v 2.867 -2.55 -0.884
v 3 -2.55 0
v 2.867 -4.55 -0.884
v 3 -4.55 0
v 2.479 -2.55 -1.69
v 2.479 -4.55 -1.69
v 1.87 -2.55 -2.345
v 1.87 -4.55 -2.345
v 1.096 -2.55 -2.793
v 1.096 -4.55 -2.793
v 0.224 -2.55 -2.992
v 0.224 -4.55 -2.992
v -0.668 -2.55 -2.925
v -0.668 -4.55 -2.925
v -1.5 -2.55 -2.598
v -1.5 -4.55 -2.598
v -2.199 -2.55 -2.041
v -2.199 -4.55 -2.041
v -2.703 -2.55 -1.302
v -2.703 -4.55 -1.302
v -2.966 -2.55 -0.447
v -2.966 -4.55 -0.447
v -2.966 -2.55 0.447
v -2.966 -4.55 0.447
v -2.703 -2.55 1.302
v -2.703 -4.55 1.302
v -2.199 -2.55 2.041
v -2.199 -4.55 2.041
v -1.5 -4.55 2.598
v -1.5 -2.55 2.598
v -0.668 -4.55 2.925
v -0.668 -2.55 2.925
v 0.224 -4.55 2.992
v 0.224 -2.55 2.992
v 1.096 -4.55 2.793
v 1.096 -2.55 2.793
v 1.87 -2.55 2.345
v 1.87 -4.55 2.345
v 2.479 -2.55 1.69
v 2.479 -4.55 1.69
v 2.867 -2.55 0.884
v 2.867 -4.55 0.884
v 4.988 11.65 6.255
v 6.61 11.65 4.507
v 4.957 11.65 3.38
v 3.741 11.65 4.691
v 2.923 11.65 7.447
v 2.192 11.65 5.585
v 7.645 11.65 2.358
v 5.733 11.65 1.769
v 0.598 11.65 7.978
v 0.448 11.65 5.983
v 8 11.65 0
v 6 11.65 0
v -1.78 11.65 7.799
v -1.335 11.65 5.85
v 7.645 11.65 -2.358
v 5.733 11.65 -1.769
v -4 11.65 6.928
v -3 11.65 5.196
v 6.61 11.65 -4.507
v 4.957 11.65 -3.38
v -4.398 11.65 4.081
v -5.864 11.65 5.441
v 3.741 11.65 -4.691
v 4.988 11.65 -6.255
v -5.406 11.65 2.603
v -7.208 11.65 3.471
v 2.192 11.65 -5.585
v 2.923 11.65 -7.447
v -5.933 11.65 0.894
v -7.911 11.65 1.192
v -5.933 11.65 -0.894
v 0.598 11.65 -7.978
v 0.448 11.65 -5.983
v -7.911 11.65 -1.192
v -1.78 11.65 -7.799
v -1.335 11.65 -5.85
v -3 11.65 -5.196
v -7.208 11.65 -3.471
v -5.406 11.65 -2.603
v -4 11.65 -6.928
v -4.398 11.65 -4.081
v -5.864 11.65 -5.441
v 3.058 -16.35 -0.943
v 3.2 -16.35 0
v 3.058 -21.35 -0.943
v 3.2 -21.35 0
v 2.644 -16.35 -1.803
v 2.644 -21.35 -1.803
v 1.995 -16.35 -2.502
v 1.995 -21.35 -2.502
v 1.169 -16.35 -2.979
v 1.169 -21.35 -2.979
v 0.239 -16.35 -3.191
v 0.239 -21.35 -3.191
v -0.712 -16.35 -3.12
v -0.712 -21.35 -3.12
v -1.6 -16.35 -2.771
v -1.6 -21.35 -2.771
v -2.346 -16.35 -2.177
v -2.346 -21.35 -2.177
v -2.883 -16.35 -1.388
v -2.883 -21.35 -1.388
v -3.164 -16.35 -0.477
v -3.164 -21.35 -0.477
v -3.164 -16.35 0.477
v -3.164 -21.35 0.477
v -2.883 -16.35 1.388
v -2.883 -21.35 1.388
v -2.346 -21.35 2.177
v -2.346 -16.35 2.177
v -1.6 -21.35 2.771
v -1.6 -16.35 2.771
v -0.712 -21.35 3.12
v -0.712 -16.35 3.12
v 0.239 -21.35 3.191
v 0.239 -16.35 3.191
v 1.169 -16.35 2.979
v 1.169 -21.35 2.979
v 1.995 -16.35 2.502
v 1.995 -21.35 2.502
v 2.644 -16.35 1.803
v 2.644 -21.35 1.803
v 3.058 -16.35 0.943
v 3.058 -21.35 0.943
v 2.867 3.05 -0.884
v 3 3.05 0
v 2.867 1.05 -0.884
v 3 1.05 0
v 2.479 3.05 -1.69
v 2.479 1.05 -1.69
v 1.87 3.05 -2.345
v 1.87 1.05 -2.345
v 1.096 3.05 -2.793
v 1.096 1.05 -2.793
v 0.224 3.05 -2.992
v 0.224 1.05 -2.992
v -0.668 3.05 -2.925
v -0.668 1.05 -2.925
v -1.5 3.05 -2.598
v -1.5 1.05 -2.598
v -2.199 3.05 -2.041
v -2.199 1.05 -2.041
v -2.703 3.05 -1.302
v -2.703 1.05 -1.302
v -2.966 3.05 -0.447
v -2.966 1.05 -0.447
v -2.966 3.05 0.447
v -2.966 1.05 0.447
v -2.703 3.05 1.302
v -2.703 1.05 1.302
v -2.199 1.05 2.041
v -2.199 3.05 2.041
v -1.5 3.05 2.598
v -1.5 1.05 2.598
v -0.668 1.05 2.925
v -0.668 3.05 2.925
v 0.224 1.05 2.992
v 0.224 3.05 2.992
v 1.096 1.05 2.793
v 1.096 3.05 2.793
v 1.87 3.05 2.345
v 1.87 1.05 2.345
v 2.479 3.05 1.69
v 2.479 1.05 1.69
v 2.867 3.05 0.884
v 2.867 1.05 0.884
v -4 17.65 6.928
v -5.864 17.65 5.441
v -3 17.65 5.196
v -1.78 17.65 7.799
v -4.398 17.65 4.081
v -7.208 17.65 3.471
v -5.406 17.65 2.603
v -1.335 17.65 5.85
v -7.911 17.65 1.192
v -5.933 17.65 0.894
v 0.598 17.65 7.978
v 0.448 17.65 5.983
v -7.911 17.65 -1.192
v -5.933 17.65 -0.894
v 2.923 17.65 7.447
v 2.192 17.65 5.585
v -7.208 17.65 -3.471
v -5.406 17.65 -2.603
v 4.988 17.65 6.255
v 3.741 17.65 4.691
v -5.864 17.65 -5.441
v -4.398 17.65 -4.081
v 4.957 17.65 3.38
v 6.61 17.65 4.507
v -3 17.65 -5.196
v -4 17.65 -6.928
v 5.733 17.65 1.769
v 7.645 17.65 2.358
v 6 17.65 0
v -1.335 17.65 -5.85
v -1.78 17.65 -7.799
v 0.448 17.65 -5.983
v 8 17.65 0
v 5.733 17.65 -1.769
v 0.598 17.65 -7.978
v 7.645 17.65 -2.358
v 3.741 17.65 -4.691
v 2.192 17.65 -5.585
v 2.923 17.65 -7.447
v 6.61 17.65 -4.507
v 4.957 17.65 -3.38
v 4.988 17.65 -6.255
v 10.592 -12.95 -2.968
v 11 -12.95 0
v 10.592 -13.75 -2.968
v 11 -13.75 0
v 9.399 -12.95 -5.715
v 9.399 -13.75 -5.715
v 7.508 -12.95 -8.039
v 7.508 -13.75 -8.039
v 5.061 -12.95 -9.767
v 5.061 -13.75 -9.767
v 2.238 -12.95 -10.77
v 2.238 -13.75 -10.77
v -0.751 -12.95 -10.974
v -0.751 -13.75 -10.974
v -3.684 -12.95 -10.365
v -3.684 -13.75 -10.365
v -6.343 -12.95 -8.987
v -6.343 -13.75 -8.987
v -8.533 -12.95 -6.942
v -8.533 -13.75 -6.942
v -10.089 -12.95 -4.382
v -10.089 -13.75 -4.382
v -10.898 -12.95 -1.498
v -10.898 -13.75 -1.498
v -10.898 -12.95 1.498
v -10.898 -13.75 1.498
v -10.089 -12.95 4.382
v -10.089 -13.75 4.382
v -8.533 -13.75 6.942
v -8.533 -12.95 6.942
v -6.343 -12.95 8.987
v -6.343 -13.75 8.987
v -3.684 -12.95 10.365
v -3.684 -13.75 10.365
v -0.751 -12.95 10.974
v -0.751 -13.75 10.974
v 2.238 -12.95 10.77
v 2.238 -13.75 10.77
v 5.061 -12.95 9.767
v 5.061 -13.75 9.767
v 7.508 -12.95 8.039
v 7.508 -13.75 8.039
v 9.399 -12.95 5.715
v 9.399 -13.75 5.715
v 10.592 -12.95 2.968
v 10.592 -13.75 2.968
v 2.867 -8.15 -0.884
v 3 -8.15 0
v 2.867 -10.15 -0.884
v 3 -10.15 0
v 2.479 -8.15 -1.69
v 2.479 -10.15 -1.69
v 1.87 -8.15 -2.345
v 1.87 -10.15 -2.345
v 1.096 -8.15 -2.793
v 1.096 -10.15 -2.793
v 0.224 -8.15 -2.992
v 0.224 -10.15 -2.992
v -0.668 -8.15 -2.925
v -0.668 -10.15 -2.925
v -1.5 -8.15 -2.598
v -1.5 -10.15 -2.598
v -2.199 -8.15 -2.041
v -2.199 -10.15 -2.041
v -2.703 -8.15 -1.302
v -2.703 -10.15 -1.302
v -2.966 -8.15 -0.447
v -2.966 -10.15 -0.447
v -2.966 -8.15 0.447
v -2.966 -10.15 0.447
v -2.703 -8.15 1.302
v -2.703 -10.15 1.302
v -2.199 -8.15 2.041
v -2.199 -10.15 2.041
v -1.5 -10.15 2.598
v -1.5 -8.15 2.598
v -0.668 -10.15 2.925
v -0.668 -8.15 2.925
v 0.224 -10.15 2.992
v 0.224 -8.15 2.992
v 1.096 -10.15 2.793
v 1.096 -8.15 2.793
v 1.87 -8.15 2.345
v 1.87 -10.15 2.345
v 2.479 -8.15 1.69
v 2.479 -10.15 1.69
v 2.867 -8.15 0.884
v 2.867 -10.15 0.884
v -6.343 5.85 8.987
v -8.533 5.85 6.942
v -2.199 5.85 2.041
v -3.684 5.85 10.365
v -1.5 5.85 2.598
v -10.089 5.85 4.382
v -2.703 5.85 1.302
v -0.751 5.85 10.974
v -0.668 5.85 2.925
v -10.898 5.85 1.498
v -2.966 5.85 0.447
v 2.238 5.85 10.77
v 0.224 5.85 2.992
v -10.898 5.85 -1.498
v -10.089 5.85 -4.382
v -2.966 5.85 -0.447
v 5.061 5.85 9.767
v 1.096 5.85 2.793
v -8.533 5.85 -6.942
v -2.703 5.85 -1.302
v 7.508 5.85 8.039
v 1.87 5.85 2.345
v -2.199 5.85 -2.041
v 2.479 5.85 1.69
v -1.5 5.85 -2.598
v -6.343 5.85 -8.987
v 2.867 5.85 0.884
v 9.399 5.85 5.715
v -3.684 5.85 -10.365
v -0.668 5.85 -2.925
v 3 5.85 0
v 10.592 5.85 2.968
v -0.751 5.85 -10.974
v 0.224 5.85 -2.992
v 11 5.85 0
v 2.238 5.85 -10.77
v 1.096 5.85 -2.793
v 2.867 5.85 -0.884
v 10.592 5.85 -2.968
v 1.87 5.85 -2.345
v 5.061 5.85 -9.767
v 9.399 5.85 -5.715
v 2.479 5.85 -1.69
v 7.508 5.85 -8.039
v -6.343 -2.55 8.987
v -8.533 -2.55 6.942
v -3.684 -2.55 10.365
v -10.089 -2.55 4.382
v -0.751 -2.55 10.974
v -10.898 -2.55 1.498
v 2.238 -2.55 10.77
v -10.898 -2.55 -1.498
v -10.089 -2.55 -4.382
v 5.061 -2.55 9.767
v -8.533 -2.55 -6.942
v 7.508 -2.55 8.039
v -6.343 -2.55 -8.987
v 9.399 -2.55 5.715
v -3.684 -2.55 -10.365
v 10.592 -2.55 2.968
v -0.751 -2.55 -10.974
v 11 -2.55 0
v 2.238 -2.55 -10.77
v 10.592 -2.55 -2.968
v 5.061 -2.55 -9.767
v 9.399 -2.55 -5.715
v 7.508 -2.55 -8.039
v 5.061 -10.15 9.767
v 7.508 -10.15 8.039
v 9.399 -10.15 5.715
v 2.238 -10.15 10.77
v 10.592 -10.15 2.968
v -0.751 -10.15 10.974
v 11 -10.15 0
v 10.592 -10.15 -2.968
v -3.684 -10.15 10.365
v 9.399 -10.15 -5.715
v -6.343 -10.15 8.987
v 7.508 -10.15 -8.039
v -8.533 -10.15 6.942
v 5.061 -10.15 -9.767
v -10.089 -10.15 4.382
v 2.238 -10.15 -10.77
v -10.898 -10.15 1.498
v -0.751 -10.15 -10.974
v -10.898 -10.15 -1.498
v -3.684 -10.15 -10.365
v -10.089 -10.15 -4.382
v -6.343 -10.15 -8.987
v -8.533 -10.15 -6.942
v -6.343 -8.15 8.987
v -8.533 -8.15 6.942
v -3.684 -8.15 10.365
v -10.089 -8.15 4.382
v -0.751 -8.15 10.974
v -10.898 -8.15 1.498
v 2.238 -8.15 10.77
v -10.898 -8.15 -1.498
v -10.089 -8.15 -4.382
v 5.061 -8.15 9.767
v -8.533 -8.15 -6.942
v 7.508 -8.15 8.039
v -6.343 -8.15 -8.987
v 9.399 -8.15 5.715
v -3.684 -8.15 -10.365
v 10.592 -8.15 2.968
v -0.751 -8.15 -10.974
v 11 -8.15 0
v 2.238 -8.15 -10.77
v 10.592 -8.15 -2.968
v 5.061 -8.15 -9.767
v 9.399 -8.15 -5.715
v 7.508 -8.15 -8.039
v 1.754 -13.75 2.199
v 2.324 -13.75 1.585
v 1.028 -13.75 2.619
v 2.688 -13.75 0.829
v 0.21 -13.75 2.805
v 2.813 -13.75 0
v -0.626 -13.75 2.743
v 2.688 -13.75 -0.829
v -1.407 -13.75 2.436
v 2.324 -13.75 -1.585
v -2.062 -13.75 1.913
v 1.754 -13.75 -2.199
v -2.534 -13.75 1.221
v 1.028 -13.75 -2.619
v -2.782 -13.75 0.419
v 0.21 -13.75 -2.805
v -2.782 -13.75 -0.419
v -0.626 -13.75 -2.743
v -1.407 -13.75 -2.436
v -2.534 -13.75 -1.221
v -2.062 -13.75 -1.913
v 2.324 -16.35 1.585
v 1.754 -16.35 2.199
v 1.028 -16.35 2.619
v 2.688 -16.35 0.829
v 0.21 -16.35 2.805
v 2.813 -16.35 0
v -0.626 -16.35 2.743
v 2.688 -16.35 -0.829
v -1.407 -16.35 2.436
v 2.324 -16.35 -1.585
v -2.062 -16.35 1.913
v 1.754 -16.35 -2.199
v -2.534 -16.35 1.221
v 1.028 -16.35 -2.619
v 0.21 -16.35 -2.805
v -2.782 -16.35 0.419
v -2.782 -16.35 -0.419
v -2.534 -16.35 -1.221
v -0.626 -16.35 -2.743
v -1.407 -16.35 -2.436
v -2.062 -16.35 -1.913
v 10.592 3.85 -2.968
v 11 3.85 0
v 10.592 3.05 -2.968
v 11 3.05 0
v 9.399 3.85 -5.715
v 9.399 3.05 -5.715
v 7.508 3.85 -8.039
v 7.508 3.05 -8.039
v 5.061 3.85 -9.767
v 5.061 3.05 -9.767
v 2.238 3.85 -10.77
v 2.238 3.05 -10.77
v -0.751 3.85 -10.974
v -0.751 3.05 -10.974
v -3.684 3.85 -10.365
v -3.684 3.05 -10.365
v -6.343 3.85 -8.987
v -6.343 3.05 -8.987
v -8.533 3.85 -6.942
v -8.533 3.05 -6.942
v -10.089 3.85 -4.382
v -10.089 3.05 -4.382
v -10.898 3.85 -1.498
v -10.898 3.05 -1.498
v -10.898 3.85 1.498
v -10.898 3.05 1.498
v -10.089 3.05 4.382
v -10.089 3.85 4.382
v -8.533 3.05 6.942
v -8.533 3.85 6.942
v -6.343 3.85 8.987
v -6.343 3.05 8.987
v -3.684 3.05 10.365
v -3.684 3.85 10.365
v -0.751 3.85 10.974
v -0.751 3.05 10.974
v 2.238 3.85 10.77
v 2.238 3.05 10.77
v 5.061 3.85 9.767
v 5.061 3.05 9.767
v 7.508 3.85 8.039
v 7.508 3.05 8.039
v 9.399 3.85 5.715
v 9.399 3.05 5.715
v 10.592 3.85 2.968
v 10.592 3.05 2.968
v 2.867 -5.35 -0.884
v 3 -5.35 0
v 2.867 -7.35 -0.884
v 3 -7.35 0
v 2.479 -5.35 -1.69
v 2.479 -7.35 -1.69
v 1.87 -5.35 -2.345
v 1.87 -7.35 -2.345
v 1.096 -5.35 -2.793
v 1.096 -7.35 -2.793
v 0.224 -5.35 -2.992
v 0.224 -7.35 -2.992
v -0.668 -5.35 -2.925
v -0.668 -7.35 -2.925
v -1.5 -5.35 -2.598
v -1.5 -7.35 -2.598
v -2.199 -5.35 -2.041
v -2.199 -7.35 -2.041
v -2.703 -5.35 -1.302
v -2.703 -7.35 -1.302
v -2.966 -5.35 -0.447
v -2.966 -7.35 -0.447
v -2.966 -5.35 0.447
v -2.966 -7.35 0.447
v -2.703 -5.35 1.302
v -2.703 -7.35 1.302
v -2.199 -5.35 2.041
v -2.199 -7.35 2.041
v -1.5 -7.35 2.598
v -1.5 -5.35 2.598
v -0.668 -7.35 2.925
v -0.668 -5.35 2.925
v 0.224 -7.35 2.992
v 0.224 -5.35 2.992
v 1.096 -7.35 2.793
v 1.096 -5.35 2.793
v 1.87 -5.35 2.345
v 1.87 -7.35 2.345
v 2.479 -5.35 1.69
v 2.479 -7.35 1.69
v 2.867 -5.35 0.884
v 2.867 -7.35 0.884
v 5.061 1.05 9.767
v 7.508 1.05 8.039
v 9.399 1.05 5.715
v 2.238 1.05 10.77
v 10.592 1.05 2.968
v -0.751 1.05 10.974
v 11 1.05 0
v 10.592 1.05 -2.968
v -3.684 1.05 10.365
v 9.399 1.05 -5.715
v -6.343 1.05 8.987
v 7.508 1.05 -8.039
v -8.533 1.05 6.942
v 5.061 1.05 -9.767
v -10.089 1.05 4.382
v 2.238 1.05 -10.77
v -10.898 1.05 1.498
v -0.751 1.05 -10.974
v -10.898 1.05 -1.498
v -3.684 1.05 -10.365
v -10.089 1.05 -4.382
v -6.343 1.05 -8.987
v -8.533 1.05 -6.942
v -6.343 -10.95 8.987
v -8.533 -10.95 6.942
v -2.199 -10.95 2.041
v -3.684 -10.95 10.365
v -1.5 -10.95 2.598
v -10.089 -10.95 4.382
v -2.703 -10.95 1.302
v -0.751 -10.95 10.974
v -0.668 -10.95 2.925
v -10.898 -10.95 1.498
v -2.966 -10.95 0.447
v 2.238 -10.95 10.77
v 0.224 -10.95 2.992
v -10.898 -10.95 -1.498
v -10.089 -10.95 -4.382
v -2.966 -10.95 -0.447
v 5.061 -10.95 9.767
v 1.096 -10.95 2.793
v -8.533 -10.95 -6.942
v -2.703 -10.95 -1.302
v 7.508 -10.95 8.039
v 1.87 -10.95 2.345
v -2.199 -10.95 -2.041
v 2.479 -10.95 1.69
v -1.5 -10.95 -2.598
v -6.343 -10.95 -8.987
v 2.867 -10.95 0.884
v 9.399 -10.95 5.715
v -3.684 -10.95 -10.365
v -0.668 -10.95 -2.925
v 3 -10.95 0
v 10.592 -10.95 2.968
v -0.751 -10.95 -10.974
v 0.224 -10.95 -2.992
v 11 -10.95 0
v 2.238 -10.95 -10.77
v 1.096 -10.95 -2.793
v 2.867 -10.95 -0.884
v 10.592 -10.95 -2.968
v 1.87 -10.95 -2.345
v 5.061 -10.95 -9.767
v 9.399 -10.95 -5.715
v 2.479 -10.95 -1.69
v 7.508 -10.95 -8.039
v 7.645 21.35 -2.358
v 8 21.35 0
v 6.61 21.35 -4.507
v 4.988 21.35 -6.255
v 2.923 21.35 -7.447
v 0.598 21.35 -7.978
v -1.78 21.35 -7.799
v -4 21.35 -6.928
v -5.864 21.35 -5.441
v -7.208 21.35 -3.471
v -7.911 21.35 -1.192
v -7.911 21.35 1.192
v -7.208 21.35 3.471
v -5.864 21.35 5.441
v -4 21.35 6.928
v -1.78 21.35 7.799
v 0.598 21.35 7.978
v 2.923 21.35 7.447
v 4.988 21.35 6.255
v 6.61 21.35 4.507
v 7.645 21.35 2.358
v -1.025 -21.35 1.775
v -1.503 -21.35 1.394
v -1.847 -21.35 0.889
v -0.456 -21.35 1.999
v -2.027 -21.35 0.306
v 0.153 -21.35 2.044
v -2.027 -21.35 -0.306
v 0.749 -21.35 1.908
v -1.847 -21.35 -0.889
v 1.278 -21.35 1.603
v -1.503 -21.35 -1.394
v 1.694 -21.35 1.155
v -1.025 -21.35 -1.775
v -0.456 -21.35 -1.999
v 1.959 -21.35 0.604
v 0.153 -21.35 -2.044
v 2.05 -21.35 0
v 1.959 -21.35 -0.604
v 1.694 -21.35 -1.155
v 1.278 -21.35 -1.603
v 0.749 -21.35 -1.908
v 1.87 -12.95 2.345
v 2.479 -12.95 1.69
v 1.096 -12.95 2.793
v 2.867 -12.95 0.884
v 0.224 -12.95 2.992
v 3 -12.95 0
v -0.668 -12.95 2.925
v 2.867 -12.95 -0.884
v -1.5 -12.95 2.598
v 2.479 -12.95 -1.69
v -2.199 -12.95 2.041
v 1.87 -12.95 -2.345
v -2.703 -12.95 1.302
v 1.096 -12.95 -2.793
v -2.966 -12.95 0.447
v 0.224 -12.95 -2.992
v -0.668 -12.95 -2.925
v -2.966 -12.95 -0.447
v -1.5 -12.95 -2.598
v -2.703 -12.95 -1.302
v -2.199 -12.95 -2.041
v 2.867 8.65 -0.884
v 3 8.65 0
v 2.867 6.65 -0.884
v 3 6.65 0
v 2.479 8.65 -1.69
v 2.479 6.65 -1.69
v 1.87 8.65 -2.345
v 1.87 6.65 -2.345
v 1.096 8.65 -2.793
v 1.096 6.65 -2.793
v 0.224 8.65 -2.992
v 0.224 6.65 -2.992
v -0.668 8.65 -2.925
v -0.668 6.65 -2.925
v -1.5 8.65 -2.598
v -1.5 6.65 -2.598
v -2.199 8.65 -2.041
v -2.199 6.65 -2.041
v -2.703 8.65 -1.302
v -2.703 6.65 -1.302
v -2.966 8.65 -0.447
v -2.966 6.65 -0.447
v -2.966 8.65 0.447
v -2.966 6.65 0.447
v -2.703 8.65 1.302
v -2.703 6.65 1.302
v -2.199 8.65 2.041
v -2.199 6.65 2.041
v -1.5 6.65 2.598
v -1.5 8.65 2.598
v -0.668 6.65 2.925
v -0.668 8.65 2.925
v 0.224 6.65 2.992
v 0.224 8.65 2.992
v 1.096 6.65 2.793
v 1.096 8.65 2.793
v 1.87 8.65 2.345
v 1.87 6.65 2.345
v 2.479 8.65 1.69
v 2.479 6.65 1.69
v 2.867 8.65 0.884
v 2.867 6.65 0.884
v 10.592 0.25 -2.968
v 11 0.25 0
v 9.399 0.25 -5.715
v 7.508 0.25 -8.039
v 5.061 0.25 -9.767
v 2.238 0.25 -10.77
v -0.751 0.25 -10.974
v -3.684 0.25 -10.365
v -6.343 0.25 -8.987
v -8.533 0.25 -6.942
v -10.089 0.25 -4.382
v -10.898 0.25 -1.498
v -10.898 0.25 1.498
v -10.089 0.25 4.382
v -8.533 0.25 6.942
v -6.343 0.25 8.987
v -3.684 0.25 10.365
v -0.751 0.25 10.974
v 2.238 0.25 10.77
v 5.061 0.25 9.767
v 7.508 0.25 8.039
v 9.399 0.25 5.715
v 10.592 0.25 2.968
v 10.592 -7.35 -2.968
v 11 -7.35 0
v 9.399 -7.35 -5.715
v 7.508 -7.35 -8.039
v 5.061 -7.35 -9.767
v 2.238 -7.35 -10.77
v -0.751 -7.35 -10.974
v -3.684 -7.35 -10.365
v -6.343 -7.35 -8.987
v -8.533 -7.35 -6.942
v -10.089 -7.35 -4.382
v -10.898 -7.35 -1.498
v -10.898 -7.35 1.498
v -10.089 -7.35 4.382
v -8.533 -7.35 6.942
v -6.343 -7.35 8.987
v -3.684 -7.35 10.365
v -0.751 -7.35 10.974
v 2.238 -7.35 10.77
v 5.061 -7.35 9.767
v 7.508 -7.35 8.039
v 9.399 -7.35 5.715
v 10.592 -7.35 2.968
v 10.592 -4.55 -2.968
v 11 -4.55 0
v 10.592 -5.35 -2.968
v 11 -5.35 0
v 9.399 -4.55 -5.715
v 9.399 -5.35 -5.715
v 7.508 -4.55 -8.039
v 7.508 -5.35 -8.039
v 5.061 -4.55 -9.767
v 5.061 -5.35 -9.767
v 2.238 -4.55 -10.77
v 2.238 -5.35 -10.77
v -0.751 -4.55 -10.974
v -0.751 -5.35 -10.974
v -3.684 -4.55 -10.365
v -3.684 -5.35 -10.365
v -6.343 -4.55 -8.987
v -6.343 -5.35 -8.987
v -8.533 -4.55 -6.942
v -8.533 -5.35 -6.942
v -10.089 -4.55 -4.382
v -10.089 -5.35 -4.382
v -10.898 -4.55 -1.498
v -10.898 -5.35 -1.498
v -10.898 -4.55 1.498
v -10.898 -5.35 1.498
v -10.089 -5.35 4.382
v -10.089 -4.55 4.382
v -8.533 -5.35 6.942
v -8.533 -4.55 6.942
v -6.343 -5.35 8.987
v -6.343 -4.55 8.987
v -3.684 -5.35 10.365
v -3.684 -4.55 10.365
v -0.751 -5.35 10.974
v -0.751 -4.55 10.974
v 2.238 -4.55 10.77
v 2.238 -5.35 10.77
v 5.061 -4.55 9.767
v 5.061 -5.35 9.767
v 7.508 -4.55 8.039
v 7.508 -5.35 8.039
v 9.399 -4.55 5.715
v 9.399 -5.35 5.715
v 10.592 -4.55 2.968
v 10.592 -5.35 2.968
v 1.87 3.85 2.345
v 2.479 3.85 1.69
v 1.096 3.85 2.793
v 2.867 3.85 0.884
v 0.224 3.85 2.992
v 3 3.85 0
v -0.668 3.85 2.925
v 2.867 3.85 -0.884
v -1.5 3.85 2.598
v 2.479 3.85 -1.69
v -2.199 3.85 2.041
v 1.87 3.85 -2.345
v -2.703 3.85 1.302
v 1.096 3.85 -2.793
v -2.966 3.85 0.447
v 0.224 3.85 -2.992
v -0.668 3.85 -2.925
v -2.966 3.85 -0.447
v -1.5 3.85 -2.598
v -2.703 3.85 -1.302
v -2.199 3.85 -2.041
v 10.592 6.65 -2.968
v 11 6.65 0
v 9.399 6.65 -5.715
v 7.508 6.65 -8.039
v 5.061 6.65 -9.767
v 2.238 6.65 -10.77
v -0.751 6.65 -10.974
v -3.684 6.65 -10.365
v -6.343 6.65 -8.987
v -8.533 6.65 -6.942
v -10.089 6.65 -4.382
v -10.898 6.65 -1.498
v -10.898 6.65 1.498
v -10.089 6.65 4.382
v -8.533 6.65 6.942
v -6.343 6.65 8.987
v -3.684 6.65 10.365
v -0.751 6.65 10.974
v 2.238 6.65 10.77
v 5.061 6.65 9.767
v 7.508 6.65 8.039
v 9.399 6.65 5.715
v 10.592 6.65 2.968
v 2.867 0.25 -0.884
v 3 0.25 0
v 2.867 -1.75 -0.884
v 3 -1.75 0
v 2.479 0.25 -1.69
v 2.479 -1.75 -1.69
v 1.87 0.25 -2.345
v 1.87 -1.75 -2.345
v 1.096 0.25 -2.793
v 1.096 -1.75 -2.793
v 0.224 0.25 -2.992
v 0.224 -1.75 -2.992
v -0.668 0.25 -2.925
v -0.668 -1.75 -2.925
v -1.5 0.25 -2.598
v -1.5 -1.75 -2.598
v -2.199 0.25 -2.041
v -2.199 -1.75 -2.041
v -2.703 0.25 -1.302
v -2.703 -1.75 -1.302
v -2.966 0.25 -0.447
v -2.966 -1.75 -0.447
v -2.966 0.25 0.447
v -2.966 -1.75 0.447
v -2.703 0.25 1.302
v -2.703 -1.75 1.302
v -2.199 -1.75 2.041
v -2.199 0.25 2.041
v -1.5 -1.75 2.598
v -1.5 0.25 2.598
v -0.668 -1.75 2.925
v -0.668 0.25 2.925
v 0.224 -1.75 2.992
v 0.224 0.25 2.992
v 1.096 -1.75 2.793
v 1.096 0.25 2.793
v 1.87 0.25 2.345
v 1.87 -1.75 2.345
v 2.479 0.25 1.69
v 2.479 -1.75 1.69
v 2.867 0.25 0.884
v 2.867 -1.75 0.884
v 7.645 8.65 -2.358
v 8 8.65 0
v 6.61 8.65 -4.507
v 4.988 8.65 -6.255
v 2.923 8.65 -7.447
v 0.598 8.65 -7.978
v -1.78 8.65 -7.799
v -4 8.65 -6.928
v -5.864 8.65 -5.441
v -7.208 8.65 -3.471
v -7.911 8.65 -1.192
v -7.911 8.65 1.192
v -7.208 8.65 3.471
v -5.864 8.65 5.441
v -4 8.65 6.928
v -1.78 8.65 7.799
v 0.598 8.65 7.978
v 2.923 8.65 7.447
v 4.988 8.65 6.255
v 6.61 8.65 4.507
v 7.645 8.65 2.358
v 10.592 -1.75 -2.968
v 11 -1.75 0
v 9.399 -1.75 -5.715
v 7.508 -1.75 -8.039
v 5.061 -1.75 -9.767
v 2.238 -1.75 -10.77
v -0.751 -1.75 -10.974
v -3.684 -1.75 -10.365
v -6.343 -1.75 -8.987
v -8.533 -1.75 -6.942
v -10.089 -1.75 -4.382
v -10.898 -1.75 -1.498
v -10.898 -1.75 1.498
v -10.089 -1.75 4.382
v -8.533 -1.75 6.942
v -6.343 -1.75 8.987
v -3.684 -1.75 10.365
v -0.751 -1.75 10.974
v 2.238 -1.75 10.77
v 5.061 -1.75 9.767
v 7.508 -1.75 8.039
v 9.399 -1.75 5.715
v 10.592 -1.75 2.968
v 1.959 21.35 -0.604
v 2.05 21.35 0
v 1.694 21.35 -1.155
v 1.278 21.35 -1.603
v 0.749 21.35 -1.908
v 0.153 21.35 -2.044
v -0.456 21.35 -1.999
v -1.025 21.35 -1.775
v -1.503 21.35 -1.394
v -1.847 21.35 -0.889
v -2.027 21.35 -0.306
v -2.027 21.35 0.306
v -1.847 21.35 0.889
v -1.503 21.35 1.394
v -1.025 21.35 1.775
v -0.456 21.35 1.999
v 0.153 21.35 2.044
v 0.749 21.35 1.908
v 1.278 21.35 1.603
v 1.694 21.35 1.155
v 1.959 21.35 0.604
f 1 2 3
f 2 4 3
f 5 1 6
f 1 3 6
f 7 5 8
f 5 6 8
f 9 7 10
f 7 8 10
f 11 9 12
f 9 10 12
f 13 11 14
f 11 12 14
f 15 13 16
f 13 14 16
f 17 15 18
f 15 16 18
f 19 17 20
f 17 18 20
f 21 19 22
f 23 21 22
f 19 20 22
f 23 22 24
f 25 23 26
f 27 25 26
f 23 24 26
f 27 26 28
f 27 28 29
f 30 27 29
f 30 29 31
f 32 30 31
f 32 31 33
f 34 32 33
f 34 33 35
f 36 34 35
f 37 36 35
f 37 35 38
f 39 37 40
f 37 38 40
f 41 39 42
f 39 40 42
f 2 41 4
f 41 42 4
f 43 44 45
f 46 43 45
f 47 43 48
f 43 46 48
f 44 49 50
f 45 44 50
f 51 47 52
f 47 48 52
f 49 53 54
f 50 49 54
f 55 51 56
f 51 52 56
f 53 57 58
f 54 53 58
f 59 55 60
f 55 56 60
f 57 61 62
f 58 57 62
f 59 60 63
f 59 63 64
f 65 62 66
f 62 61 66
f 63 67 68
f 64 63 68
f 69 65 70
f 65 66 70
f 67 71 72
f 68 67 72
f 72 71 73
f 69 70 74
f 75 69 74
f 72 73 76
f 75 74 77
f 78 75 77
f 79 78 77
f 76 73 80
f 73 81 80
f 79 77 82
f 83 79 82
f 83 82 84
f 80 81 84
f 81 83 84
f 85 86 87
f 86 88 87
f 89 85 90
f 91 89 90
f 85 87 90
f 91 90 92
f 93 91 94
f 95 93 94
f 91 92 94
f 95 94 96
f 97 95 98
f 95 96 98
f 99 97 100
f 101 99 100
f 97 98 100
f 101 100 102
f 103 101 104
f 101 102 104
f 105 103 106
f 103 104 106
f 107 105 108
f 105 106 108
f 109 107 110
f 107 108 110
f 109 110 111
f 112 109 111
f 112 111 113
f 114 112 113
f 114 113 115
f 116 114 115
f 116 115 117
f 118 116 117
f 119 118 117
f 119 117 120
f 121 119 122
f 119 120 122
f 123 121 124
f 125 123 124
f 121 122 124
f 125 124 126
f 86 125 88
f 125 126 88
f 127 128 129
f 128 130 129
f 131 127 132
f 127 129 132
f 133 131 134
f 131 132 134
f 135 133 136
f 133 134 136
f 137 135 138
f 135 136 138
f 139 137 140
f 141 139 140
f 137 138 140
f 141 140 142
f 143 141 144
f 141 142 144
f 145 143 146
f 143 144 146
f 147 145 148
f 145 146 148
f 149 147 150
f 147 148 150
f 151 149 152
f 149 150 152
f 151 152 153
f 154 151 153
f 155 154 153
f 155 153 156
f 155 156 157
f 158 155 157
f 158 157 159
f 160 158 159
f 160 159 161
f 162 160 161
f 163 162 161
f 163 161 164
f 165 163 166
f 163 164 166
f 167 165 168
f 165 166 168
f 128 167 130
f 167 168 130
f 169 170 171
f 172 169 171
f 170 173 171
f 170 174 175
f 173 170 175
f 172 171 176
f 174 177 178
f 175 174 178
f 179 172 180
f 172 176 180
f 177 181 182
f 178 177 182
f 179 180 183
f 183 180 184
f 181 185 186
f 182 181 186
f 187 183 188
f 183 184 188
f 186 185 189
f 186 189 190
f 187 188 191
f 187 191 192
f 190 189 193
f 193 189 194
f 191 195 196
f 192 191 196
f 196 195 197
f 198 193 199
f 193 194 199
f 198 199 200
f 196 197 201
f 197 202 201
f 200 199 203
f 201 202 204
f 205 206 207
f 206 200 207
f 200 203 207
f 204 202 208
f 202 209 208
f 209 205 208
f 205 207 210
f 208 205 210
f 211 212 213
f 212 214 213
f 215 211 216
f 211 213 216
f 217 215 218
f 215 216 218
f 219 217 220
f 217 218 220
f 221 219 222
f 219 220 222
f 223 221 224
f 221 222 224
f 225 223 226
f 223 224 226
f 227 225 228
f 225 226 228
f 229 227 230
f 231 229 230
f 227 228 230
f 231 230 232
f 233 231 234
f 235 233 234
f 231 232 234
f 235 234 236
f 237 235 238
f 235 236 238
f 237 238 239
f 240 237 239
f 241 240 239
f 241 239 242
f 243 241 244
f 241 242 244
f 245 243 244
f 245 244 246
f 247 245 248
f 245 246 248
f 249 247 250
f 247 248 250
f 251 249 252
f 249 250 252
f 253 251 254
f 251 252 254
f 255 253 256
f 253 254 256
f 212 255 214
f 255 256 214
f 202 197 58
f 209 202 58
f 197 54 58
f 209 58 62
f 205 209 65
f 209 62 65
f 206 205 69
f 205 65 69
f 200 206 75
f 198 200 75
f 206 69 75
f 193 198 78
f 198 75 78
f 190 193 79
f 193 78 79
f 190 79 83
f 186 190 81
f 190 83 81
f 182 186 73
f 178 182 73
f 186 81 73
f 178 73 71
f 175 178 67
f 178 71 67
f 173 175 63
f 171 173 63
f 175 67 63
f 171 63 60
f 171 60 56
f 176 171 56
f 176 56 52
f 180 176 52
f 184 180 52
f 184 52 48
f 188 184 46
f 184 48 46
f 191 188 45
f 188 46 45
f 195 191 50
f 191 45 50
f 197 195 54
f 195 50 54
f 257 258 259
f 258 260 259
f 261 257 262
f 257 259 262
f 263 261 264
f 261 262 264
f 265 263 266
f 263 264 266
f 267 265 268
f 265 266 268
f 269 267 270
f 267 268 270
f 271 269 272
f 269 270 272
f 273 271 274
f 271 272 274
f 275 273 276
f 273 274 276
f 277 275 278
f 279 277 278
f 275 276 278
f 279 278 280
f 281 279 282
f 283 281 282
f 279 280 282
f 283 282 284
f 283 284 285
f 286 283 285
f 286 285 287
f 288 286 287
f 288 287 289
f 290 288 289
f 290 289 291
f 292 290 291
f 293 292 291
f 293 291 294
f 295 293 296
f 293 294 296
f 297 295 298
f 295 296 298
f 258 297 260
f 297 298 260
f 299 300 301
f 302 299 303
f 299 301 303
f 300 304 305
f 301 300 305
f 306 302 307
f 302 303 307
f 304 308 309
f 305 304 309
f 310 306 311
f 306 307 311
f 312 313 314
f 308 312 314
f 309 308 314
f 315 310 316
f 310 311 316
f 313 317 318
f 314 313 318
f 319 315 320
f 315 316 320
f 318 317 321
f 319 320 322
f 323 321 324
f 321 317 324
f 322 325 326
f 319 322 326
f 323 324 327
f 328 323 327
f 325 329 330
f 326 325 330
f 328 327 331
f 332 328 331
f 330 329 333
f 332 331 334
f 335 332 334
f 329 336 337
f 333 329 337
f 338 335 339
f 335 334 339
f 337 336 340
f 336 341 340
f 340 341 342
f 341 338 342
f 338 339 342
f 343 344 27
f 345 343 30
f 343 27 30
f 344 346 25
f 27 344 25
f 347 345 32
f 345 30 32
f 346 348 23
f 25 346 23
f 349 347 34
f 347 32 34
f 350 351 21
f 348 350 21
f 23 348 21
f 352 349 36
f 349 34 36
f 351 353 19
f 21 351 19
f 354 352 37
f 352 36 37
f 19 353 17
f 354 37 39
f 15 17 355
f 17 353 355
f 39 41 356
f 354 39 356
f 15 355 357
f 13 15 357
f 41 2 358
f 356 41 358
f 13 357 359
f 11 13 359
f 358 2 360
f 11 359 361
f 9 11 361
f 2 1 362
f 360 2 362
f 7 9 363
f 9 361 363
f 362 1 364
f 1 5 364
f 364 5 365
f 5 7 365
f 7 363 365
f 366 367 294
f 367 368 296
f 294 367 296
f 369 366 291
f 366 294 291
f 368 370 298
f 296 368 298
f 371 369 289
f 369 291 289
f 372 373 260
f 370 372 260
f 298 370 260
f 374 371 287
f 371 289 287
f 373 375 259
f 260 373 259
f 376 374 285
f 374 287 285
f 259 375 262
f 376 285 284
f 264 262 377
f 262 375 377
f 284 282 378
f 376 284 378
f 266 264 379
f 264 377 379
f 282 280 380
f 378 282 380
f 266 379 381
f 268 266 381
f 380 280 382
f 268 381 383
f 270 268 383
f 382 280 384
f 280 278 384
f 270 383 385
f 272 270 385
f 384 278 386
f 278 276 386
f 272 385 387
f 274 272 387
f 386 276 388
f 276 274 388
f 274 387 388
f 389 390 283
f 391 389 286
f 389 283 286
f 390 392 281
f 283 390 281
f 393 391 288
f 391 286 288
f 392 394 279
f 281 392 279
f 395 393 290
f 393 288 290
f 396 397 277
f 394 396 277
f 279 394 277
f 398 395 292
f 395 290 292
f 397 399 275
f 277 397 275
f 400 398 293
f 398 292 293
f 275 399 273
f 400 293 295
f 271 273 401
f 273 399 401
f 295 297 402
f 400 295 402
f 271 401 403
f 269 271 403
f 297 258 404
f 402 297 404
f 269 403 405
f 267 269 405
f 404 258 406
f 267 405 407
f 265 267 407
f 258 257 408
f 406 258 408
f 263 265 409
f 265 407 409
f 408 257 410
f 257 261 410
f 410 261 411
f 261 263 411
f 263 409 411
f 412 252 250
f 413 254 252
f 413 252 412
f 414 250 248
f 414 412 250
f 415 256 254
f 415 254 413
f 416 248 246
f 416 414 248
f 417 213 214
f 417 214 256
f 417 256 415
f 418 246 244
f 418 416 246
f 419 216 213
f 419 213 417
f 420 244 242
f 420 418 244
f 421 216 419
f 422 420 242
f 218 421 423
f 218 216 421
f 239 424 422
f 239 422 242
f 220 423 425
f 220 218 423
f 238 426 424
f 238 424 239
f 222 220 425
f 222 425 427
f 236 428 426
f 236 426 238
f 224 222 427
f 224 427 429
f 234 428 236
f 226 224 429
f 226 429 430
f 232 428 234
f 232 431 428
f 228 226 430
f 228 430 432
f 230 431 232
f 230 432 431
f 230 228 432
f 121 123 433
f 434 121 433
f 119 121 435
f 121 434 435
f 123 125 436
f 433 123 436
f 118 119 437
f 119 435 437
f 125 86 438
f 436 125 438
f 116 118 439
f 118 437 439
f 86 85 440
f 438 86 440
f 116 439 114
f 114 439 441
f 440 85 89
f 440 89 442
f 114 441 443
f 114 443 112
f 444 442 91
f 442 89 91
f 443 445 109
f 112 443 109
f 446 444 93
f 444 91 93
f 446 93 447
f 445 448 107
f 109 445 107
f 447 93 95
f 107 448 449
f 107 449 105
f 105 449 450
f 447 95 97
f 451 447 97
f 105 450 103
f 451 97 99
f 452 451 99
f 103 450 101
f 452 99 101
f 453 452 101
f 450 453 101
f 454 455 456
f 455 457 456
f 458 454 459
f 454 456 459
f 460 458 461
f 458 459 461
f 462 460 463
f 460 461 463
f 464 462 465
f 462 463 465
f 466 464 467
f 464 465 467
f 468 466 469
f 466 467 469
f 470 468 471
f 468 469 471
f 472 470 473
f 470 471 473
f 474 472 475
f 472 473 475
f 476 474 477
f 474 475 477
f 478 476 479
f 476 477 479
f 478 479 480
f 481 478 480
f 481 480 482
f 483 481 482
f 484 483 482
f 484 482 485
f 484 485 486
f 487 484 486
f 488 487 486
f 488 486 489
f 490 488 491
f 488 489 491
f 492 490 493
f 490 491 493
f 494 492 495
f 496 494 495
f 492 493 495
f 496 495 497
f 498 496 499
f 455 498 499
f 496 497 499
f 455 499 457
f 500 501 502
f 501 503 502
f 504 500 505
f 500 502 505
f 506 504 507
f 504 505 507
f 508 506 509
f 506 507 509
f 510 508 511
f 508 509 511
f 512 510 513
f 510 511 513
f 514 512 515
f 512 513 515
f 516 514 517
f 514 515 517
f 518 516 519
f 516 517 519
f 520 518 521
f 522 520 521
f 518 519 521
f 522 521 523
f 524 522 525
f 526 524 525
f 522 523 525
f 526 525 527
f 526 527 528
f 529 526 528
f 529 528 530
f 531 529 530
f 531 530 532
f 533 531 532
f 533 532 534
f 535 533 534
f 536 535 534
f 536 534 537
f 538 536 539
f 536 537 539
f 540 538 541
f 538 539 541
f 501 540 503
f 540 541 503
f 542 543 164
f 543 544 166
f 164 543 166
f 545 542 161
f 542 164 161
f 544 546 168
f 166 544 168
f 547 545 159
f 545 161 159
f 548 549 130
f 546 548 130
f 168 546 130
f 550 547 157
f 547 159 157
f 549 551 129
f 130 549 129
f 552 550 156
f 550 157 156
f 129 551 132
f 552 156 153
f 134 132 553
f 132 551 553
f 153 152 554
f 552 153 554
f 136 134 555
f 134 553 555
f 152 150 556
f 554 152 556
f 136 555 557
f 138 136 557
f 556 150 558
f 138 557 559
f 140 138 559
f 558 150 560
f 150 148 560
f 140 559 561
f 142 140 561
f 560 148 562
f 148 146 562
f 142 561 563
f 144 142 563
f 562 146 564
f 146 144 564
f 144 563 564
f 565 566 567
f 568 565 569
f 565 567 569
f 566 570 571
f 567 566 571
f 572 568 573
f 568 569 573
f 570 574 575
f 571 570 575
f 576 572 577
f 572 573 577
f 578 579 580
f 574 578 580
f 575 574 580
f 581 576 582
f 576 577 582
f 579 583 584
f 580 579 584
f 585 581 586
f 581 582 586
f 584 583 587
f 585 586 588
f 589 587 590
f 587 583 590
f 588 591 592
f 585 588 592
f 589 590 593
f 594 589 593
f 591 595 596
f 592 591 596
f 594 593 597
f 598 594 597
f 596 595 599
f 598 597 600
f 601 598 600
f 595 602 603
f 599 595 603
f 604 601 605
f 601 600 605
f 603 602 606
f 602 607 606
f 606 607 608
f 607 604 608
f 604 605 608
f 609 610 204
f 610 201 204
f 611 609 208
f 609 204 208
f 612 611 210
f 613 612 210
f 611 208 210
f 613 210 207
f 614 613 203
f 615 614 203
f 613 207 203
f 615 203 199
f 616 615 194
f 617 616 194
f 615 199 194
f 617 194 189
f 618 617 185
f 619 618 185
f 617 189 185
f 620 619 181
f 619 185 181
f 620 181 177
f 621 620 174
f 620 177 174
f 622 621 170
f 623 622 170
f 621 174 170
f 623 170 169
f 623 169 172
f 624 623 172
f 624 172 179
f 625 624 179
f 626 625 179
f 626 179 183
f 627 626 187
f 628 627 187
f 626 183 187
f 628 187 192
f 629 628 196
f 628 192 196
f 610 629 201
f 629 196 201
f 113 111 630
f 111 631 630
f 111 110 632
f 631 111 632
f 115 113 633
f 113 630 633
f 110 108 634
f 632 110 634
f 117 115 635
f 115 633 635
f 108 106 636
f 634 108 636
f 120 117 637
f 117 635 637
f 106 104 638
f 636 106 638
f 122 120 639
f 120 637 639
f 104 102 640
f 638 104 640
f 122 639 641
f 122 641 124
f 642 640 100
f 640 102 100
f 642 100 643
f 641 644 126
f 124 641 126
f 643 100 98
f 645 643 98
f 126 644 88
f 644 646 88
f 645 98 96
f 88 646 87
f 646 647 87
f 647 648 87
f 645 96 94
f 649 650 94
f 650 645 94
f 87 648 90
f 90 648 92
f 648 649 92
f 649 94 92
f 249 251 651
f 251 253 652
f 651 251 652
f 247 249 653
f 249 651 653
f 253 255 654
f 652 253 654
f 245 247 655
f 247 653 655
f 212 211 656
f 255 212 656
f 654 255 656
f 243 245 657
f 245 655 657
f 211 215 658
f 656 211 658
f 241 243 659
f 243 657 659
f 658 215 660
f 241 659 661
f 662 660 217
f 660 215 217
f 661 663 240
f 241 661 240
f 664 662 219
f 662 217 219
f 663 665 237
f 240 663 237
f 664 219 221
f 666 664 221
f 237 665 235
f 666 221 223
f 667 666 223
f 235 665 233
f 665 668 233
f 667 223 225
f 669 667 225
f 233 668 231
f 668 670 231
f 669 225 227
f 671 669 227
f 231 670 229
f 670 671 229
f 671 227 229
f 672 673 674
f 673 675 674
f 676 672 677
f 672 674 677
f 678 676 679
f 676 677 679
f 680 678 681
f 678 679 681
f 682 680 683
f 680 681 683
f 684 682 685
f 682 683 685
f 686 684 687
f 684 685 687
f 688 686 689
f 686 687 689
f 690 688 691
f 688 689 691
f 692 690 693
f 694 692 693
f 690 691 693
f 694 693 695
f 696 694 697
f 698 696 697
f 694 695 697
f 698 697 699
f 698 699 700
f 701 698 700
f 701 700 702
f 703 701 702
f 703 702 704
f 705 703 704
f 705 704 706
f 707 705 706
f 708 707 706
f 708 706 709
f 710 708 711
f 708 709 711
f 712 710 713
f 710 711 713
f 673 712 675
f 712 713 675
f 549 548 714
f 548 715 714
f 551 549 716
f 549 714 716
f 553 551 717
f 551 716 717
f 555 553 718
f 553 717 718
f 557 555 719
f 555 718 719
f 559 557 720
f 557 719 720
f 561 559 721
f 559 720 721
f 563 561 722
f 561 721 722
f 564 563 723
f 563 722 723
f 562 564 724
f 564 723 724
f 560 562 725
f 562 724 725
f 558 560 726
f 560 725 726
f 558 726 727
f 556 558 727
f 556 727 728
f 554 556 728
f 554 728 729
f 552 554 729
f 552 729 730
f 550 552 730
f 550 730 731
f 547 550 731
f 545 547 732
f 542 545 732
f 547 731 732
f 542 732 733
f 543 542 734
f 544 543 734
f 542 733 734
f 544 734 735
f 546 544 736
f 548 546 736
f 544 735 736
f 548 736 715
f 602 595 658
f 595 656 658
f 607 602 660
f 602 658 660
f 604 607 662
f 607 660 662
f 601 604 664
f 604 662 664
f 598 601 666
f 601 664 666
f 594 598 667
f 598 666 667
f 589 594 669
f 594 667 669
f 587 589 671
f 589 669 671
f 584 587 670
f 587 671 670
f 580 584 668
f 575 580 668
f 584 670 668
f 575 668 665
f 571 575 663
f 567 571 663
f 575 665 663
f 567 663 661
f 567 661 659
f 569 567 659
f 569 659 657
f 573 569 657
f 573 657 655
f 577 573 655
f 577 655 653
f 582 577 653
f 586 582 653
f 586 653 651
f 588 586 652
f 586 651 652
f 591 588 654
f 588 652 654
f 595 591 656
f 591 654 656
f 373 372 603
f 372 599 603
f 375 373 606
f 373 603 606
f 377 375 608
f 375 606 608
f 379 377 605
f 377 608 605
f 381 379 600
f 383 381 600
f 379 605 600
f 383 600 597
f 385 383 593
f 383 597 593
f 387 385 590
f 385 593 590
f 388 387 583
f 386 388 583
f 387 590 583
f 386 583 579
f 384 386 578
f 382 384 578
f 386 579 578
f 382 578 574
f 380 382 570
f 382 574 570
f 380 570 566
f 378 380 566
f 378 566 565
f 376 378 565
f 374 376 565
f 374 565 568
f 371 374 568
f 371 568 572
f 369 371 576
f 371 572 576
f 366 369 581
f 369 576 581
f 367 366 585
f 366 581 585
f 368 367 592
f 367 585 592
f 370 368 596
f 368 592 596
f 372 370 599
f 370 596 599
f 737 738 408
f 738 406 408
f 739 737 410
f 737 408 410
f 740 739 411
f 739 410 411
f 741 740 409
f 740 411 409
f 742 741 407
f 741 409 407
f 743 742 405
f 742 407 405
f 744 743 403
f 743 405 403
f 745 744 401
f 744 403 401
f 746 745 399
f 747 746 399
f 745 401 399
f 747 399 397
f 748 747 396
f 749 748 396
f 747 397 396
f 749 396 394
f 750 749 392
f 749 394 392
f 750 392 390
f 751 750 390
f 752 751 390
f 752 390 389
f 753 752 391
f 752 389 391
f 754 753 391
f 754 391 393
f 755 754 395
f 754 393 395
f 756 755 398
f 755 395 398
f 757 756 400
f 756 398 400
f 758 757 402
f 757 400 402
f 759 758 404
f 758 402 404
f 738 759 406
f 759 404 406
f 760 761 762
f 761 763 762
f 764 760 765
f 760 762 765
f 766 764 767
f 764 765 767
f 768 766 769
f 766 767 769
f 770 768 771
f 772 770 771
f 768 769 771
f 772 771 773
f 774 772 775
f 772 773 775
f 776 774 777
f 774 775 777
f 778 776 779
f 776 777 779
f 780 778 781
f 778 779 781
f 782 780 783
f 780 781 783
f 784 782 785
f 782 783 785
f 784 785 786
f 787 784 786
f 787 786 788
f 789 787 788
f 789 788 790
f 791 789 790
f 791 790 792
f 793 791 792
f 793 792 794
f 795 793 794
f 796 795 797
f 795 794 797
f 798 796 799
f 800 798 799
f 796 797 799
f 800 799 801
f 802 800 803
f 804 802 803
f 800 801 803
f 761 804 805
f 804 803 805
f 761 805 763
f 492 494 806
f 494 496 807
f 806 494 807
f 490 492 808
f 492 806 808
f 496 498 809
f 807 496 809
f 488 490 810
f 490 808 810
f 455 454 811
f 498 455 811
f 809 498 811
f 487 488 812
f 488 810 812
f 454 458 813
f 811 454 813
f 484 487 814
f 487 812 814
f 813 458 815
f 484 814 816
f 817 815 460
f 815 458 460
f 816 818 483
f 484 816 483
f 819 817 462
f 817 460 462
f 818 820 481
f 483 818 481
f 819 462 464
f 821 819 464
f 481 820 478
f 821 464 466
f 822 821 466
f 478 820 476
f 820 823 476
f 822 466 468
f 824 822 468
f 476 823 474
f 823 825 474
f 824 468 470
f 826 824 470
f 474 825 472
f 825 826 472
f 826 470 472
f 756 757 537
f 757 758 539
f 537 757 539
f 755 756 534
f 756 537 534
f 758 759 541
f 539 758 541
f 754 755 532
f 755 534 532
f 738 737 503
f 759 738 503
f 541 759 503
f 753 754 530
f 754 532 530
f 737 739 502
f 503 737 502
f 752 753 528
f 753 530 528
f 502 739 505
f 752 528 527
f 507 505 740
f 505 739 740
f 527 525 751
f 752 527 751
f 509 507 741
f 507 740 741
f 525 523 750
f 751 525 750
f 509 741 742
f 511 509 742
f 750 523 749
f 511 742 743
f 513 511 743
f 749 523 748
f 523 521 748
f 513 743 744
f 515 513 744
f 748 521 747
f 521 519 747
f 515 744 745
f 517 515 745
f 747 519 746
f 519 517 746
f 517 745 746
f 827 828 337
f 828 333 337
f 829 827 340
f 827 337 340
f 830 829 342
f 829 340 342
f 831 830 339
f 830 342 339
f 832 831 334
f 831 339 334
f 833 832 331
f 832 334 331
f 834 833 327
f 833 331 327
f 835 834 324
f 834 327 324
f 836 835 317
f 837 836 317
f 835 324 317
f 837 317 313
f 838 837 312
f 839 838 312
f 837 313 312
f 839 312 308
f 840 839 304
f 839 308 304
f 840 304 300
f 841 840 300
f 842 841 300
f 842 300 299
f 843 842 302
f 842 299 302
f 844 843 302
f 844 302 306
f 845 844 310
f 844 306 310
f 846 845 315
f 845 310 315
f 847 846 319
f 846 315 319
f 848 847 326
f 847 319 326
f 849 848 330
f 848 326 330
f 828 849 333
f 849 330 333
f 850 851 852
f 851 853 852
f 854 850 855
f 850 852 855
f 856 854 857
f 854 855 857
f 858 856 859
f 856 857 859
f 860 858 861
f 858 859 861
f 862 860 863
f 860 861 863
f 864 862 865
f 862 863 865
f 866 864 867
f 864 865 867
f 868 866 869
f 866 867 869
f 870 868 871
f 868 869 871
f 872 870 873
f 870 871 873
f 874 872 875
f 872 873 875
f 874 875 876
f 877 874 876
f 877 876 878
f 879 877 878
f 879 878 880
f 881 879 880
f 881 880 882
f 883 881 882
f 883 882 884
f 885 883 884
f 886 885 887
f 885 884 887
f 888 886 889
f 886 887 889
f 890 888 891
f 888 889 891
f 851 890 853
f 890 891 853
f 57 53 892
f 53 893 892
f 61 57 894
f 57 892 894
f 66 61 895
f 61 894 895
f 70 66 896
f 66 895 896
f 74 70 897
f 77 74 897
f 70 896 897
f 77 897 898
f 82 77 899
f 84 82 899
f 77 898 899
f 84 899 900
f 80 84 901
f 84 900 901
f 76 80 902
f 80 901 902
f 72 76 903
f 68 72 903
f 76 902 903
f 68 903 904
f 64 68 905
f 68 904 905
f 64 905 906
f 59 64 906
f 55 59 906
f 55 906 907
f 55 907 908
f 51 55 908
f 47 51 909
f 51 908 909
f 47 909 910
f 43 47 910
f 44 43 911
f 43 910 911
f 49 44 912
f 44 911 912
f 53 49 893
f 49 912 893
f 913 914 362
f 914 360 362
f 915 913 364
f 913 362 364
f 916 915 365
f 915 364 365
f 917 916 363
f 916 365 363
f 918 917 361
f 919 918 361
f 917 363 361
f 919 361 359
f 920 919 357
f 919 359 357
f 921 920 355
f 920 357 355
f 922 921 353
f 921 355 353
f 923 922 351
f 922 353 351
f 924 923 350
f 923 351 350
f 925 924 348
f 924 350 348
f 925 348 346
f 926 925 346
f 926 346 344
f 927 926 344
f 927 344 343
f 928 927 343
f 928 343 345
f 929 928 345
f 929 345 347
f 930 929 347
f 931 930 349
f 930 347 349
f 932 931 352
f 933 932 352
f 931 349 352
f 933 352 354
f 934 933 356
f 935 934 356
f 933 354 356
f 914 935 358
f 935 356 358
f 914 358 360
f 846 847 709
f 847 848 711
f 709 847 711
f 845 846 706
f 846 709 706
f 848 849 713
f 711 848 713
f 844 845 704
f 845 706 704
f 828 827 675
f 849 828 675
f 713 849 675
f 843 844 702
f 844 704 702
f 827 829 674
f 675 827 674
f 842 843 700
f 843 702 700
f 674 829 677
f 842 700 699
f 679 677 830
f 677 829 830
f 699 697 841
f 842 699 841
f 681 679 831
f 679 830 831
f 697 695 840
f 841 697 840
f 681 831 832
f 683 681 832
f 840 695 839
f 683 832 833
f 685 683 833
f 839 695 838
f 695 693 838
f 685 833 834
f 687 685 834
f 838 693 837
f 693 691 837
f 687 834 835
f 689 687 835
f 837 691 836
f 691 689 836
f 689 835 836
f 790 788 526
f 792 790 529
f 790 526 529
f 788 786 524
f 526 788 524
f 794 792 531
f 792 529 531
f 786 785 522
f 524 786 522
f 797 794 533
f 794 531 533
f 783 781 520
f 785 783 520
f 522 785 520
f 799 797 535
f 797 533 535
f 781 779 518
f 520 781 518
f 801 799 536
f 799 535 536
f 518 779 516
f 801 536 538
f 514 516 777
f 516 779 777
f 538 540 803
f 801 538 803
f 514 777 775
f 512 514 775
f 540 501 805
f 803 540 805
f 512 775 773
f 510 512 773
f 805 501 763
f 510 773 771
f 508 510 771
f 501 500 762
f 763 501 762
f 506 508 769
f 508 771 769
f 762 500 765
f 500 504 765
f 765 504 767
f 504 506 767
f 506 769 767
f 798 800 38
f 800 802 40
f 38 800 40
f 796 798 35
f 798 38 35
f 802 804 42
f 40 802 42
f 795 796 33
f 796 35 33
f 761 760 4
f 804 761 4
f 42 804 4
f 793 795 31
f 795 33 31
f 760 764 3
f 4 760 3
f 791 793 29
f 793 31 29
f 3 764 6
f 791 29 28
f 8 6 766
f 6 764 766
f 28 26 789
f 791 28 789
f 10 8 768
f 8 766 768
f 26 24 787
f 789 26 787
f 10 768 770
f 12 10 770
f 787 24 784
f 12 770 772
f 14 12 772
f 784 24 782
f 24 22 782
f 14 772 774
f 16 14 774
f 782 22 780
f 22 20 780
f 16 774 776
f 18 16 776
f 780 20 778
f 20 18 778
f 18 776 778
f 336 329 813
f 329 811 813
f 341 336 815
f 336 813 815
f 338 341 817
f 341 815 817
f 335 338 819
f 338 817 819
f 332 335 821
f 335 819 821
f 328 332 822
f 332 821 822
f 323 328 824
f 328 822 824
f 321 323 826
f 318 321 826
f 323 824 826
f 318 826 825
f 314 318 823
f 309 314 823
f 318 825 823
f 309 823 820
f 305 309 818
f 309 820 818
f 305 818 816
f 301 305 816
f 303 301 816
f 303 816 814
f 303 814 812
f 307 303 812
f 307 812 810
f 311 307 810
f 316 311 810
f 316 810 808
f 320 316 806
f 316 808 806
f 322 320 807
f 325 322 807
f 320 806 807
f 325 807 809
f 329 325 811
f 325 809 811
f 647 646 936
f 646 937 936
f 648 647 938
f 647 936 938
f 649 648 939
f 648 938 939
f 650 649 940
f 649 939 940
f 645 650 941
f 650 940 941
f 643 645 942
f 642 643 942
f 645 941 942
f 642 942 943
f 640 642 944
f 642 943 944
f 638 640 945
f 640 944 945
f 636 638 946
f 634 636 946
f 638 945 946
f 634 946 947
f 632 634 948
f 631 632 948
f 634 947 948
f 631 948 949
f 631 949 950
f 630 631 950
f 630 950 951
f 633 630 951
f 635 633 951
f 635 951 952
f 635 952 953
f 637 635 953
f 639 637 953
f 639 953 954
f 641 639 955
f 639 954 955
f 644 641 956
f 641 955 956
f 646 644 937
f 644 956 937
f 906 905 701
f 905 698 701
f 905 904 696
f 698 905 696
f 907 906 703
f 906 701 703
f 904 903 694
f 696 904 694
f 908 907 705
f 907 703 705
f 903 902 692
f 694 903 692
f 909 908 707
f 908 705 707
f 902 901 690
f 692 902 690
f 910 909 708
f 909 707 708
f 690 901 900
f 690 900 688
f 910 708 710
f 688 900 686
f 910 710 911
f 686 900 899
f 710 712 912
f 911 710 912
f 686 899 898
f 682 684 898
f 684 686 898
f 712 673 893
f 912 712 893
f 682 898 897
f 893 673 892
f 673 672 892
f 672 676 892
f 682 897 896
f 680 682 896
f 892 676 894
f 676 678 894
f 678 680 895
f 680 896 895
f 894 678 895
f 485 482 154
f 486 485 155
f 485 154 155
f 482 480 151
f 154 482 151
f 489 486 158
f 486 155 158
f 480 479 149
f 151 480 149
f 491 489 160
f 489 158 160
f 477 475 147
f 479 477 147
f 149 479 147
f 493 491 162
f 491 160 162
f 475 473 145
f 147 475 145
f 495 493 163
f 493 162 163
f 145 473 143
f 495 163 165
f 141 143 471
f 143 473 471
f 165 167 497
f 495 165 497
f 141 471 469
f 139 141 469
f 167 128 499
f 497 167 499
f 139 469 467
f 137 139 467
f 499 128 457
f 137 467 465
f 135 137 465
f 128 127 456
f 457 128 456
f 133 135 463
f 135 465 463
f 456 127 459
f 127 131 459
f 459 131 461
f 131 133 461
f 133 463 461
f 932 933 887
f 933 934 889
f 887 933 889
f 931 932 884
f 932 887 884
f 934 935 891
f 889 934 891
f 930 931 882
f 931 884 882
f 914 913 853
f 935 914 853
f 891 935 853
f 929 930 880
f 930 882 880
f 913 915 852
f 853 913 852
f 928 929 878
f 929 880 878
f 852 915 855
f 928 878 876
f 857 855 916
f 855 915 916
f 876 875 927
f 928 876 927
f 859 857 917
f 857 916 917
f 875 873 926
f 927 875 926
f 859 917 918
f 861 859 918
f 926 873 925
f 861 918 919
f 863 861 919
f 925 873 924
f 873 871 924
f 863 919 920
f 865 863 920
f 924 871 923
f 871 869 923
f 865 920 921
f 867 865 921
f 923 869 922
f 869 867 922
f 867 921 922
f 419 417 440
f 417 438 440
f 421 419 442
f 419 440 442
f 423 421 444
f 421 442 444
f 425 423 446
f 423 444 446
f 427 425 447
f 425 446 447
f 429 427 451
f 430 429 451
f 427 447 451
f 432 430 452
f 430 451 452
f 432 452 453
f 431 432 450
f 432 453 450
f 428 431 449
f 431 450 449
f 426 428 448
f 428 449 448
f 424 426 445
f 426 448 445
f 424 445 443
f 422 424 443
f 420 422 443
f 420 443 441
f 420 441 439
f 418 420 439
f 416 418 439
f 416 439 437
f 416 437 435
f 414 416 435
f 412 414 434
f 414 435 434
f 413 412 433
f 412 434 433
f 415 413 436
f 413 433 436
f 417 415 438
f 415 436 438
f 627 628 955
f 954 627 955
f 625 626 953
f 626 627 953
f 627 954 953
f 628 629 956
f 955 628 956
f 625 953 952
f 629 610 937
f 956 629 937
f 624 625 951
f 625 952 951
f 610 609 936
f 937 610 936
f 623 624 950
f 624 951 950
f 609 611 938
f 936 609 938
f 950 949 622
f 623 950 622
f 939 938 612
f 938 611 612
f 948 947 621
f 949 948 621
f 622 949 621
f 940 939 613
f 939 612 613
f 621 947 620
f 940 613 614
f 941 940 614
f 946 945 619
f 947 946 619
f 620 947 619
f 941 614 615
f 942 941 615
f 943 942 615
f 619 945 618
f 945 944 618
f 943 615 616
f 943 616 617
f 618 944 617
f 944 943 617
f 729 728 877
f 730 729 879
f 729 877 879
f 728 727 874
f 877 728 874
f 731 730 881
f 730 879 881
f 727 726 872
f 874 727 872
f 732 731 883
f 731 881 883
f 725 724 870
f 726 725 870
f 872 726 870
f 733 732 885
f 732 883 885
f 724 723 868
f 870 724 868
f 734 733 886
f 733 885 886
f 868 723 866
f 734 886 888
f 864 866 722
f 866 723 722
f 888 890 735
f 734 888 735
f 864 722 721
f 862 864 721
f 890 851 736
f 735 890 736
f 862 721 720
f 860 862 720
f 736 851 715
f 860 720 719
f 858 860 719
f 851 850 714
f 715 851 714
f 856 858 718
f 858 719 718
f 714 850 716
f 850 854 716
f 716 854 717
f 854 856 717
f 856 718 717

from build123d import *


with BuildPart() as part:
    # Sketch1 → Revolve1 (revolve)
    with BuildSketch(Plane.XY):
        Polygon((2.05, 21.35), (8, 21.35), (8, 17.65), (6, 17.65), (6, 11.65), (8, 11.65), (8, 8.65), (3, 8.65), (3, 6.65), (11, 6.65), (11, 5.85), (3, 5.85), (3, 3.85), (11, 3.85), (11, 3.05), (3, 3.05), (3, 1.05), (11, 1.05), (11, 0.25), (3, 0.25), (3, -1.75), (11, -1.75), (11, -2.55), (3, -2.55), (3, -4.55), (11, -4.55), (11, -5.35), (3, -5.35), (3, -7.35), (11, -7.35), (11, -8.15), (3, -8.15), (3, -10.15), (11, -10.15), (11, -10.95), (3, -10.95), (3, -12.95), (11, -12.95), (11, -13.75), (3.2, -13.75), (2.81308008, -13.75), (2.81308008, -16.35), (3.2, -16.35), (3.2, -21.35), (2.05, -21.35), align=None)
    revolve(axis=Axis((0, -21.35, 0), (0, 1, 0)))


solid = part.part
